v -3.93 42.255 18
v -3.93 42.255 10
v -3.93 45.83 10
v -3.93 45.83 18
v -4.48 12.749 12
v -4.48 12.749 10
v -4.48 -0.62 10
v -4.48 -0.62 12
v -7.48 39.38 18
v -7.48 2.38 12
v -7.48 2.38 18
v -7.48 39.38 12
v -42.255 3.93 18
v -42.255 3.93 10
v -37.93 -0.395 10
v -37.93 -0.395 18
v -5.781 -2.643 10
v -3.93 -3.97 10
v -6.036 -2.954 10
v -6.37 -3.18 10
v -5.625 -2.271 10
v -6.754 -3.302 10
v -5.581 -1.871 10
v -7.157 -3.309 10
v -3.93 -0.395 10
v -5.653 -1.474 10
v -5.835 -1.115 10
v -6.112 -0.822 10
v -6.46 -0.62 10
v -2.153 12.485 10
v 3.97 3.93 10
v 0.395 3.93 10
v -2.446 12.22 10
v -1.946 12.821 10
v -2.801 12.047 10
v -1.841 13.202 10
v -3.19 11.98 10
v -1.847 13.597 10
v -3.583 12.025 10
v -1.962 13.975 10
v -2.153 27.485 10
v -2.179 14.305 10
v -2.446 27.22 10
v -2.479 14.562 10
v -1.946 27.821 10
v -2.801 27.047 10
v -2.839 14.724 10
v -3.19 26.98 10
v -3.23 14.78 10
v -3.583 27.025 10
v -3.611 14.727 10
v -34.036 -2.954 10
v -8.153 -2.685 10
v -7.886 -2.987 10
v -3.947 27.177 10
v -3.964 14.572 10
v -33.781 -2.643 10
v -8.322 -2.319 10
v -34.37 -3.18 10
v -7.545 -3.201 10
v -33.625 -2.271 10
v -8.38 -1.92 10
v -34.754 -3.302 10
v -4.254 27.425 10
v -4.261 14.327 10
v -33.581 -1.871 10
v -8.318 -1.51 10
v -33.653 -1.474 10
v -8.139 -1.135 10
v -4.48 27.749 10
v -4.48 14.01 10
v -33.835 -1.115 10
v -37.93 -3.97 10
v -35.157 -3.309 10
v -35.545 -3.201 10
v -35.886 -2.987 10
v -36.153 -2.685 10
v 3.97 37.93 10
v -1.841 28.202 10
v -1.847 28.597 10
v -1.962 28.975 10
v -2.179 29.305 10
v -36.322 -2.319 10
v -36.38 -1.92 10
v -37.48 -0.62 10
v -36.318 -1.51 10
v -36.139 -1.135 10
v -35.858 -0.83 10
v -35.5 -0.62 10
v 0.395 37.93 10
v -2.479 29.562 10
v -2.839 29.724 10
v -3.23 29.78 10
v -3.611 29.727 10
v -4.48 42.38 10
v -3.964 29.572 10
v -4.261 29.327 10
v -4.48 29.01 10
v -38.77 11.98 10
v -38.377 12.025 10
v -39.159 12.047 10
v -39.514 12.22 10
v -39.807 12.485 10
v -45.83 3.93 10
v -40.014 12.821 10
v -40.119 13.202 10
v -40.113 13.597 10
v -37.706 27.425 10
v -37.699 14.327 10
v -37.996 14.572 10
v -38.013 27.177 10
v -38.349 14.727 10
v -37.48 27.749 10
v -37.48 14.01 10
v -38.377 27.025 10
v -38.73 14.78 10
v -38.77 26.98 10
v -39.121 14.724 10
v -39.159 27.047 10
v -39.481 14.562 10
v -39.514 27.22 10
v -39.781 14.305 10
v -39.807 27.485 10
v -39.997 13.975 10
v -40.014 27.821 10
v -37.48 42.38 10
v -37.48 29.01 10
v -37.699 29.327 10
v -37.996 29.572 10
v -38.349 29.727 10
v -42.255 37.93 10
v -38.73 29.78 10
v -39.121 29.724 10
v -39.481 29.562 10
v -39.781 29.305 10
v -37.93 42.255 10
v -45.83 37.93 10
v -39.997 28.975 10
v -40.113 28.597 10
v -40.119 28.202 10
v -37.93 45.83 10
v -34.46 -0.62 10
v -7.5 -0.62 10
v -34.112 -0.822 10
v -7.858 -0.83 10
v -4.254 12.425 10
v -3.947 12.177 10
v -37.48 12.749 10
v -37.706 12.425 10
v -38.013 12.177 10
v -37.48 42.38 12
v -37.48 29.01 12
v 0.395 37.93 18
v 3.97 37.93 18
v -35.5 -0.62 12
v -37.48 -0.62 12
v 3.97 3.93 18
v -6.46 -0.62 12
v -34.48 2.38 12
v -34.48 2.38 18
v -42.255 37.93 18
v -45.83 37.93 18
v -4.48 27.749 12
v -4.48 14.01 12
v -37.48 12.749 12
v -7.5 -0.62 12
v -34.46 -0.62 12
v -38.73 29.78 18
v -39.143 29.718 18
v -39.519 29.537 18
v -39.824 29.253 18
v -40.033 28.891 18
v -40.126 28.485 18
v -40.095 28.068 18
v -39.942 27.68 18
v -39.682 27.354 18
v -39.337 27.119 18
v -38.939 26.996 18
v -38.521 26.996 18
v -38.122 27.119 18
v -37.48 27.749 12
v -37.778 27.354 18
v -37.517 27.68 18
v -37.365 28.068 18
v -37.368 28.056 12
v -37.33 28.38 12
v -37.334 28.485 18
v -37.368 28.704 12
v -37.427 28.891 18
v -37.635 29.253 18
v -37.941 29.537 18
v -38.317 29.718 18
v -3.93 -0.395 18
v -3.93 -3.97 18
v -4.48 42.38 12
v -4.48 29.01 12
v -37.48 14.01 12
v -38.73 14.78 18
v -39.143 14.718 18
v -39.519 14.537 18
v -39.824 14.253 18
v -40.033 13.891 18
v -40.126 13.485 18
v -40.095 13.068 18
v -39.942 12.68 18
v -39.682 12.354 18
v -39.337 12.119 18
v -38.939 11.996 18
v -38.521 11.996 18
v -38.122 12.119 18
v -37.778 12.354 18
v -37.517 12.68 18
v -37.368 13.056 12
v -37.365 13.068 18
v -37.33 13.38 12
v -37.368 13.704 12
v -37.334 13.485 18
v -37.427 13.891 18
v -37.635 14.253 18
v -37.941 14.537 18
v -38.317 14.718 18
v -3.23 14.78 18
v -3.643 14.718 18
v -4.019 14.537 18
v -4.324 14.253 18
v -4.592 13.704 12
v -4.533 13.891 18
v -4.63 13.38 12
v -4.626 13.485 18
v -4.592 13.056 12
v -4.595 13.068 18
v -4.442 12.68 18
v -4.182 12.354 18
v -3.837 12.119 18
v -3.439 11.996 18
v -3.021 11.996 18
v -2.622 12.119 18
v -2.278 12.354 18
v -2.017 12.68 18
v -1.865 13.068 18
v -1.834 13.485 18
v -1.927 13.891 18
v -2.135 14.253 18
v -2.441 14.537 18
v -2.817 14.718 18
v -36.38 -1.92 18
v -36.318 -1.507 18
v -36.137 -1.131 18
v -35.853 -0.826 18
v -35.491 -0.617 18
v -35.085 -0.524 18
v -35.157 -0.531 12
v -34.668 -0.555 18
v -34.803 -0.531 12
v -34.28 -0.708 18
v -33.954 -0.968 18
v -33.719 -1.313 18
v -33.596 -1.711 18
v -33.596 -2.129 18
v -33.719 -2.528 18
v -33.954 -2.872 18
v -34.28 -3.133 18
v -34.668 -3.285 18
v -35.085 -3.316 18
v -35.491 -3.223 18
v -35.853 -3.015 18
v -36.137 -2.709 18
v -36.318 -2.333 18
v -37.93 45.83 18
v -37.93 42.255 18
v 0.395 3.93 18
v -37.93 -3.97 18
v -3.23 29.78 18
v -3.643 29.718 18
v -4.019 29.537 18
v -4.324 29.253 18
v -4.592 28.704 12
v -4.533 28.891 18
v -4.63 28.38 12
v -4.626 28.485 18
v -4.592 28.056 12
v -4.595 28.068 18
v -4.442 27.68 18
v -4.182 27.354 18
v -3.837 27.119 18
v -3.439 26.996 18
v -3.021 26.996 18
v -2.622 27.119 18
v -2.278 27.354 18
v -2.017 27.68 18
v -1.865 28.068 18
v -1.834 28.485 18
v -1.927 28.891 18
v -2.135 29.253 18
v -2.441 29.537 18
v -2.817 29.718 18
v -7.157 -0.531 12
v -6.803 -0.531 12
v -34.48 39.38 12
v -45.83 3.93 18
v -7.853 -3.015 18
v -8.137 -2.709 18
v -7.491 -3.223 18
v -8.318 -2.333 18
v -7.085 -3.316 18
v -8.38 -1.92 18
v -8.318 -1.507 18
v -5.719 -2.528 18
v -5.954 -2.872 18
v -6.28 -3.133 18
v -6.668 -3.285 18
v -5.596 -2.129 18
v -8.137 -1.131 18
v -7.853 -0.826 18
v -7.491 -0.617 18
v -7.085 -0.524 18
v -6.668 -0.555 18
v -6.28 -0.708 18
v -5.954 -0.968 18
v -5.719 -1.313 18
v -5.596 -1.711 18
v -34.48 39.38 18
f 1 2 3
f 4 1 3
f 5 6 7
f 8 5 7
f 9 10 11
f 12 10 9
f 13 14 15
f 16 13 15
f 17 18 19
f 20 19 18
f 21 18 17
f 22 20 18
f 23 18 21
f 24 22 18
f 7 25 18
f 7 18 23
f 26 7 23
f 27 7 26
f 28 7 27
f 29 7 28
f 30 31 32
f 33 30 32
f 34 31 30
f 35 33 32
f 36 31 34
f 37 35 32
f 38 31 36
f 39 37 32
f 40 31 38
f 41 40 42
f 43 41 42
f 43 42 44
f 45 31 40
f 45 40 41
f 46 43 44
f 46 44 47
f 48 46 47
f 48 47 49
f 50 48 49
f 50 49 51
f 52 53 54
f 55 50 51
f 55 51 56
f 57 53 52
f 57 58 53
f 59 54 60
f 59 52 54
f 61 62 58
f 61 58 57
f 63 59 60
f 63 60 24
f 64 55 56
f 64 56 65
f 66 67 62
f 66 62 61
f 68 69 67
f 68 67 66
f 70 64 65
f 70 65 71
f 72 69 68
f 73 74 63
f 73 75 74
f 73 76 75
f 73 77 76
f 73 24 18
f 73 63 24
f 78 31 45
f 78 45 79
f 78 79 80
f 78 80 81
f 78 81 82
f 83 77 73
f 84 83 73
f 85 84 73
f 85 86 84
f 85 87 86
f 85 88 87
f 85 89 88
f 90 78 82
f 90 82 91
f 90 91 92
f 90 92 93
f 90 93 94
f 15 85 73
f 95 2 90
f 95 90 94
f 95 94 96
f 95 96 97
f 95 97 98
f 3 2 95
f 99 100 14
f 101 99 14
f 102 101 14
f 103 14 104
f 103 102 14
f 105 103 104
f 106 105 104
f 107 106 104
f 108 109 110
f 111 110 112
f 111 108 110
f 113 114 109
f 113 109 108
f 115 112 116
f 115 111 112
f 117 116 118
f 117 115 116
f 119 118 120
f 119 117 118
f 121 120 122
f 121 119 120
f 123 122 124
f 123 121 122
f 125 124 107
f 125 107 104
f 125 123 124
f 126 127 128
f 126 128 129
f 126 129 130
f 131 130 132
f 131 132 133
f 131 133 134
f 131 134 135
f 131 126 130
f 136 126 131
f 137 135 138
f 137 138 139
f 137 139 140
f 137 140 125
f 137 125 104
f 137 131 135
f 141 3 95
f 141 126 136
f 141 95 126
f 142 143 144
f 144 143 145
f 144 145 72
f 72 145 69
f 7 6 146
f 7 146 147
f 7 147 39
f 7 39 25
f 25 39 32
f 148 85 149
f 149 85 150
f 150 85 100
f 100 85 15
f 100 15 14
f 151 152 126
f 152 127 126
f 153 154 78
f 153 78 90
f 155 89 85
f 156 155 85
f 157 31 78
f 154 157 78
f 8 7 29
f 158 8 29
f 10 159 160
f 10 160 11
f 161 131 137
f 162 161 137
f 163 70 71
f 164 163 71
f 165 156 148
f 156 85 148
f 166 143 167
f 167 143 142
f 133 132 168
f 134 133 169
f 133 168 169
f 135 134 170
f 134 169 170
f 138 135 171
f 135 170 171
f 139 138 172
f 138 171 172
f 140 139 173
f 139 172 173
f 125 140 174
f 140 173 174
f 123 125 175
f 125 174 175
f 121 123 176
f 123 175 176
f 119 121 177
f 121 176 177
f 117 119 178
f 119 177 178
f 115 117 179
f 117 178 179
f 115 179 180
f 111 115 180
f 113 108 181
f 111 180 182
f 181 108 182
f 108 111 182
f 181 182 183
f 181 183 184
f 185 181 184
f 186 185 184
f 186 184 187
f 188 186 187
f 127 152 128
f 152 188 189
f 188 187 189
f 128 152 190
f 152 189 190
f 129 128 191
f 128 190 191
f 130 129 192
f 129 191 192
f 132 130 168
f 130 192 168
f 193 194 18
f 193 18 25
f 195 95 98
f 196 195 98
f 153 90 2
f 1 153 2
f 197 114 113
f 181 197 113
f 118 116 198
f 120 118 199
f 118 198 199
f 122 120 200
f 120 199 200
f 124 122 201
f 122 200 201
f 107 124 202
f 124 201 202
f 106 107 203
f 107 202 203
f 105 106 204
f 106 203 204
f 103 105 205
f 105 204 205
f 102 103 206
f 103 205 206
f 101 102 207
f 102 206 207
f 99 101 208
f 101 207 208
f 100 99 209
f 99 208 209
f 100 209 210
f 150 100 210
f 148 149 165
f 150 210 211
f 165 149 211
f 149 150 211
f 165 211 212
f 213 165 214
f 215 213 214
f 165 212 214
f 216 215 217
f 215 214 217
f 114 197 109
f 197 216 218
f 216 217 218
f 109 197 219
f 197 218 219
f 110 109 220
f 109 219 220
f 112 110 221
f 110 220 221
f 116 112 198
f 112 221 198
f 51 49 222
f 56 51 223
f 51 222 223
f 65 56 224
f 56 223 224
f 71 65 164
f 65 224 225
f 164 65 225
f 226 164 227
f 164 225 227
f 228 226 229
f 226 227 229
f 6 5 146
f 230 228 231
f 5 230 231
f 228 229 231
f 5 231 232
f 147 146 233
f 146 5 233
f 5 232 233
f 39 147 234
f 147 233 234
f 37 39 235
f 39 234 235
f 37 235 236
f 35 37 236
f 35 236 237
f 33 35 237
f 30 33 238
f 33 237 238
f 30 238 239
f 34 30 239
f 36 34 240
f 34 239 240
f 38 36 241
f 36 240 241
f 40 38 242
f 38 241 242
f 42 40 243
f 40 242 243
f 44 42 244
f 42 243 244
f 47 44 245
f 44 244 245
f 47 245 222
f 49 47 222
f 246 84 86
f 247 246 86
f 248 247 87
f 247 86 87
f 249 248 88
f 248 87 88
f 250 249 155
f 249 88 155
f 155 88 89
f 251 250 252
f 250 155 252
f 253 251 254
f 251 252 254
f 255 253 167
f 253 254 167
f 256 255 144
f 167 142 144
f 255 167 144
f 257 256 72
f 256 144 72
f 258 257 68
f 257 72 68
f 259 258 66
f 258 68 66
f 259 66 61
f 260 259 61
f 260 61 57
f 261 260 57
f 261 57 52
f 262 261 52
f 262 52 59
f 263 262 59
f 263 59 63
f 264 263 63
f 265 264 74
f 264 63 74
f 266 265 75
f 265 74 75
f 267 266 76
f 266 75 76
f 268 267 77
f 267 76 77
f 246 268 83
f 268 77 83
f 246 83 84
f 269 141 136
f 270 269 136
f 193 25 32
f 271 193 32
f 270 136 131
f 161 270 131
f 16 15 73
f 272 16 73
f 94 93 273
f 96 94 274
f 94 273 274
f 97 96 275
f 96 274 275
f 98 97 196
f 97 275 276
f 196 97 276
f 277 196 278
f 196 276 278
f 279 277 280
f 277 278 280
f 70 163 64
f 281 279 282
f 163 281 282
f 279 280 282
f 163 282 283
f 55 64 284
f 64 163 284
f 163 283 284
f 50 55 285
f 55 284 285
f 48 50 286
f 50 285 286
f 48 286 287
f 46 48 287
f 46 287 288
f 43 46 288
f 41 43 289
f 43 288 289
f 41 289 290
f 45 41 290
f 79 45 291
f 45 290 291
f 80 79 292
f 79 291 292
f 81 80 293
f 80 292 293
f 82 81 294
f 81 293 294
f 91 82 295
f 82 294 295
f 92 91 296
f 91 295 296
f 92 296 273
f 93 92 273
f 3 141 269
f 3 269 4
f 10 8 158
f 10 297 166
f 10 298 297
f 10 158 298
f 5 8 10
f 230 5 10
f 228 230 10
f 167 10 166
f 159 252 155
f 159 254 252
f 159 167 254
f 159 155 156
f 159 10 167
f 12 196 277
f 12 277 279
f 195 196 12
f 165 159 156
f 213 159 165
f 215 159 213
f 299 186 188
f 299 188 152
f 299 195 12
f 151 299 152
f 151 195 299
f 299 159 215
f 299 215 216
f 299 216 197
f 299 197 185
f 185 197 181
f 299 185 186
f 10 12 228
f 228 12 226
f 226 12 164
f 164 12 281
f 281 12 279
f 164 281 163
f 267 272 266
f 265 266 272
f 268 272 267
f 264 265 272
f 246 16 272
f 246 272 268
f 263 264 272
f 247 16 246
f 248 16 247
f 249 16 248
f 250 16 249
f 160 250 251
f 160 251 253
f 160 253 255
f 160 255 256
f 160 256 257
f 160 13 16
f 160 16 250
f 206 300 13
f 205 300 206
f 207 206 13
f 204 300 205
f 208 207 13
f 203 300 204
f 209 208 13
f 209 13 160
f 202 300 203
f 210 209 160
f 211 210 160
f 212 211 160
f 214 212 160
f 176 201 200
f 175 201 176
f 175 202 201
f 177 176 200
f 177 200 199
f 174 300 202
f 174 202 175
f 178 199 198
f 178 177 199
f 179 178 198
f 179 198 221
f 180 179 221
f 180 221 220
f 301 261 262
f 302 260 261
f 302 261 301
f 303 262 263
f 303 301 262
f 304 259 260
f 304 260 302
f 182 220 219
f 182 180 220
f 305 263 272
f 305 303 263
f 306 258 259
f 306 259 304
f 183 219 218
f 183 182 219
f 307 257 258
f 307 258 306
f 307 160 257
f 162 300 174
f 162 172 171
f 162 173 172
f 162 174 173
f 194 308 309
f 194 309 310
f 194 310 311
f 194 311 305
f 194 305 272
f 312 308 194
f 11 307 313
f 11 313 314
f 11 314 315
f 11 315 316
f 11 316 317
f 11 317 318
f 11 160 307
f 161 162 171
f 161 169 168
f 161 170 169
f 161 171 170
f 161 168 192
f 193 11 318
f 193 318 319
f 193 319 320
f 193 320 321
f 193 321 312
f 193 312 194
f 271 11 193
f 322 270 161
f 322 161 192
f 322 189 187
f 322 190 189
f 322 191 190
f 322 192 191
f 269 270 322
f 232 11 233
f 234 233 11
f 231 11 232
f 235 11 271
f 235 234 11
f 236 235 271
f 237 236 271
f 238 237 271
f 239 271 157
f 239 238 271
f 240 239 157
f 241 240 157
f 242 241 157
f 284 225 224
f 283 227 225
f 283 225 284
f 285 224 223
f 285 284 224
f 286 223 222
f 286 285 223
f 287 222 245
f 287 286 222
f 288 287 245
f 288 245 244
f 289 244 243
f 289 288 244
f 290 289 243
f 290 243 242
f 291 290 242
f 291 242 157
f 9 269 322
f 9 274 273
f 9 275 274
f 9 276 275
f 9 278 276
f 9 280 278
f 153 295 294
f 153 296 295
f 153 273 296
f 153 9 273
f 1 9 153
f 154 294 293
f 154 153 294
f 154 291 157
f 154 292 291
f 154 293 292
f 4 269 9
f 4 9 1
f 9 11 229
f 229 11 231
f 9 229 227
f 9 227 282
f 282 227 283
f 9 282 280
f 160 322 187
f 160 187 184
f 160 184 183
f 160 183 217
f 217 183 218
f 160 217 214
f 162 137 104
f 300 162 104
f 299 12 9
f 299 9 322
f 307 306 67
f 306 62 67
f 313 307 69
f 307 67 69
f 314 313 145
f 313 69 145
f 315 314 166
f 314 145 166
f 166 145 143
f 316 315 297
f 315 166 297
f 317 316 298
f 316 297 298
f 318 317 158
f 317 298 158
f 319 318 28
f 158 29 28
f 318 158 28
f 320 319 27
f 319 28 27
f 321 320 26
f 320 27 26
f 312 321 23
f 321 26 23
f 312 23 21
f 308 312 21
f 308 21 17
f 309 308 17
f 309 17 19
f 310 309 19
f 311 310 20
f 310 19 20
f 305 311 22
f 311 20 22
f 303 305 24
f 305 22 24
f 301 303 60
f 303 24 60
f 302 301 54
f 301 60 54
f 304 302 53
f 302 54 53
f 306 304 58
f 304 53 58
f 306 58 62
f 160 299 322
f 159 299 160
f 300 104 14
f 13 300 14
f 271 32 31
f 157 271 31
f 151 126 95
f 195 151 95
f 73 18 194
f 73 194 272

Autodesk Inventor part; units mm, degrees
ref_plane "YZ Plane" through (0, 0, 0) normal (1, 0, 0) x (0, 1, 0)
ref_plane "XZ Plane" through (0, 0, 0) normal (0, 1, 0) x (-1, 0, 0)
ref_plane "Work Plane1" through (0, 0, 10) normal (0, 0, 1) x (1, 0, 0)
sketch "Sketch1" plane through (0, 0, 10) normal (0, 0, 1) x (1, 0, 0)
  line L0 (-4.0299, -0.3538) -> (-2.2322, 1.4439) construction
  arc A0 (-1.4439, 2.2322) -> (-2.2322, 1.4439) centre (-0.9299, 0.9299) ccw construction
  line L1 (-1.4439, 2.2322) -> (0.3538, 4.0299) construction
  line L2 (-37.8299, 42.2137) -> (-37.8299, 45.8299) construction
  line L3 (-37.8299, 45.8299) -> (-4.0299, 45.8299) construction
  line L4 (-4.0299, 45.8299) -> (-4.0299, 42.2137) construction
  line L5 (-4.0299, 4.0299) -> (0.3538, 4.0299) projected
  circle A1 centre (-20.9299, 20.9299) radius 17.5 construction
  line L6 (-20.9299, 58.9723) -> (17.1124, 20.9299) construction
  line L7 (17.1124, 20.9299) -> (-20.9299, -17.1124) construction
  line L8 (-20.9299, -17.1124) -> (-58.9723, 20.9299) construction
  line L9 (-58.9723, 20.9299) -> (-20.9299, 58.9723) construction
  line L10 (-20.9299, 58.9723) -> (-20.9299, -17.1124) construction
  line L11 (17.1124, 20.9299) -> (-58.9723, 20.9299) construction
  line L12 (-20.9299, 58.9723) -> (32.8701, 58.9723) construction
  line L13 (-43.2198, 43.4299) -> (1.7802, 43.4299) construction
  line L14 (1.7802, 43.4299) -> (1.7802, -1.5701) construction
  line L15 (1.7802, -1.5701) -> (-43.2198, -1.5701) construction
  line L16 (-43.2198, -1.5701) -> (-43.2198, 43.4299) construction
  line L17 (-43.2198, 5.1774) -> (-43.2198, 36.6824)
  line L18 (-43.2198, 36.6824) -> (-36.4723, 43.4299)
  line L19 (-36.4723, 43.4299) -> (-5.3876, 43.4299)
  line L20 (-5.3876, 43.4299) -> (1.7802, 36.2621)
  line L21 (1.7802, 36.2621) -> (1.7802, 5.5977)
  line L22 (1.7802, 5.5977) -> (-5.3876, -1.5701)
  line L23 (-5.3876, -1.5701) -> (-36.4723, -1.5701)
  line L24 (-36.4723, -1.5701) -> (-43.2198, 5.1774)
  line L25 (-4.0299, 42.2137) -> (-37.8299, 42.2137) projected
  line L26 (-4.0299, -0.3538) -> (-4.0299, 4.0299) projected
  line L27 (-43.2198, 43.4299) -> (-10.4667, 10.6769) construction
  line L28 (-8.5595, 8.5517) -> (1.7802, -1.5701) construction
  line L29 (1.7802, 43.4299) -> (-25.699, 15.9507) construction
  line L30 (-30.9728, 10.6769) -> (-43.2198, -1.5701) construction
  point P0 (-37.8299, 4.0299)
  dimension "d18" = 53.8
  dimension "d19" = 45
  dimension "d20" = 53.8
  dimension "d21" = 45
  dimension "d22" = 45
extrude "Extrusion1" add sketch "Sketch1" along normal blind 8
sketch "Sketch3" plane through (0, 0, 10) normal (0, 0, -1) x (-1, 0, 0)
  line L0 (37.8299, -0.4701) -> (37.8299, 4.0299) construction
  line L1 (4.0299, 4.0299) -> (4.0299, -0.4701) construction
  line L2 (37.8299, -0.4701) -> (37.8299, 1.1886) construction
  line L3 (4.0299, -3.9701) -> (4.0299, -0.3538) construction
  line L4 (45.8299, 4.0299) -> (42.2137, 4.0299) construction
  line L5 (-0.3538, 4.0299) -> (-3.9701, 4.0299) construction
  line L6 (-3.9701, 37.8299) -> (-0.3538, 37.8299) construction
  line L7 (4.0299, 42.2137) -> (4.0299, 45.8299) construction
  line L8 (37.8299, 45.8299) -> (37.8299, 42.2137) construction
  line L9 (42.2137, 37.8299) -> (45.8299, 37.8299) construction
  line L10 (37.8299, 37.7299) -> (45.8299, 37.7299)
  line L11 (45.8299, 37.7299) -> (45.8299, 4.1299)
  line L12 (45.8299, 4.1299) -> (37.8299, 4.1299)
  line L13 (37.8299, 4.1299) -> (37.8299, 37.7299)
  line L14 (37.7299, 4.0299) -> (4.1299, 4.0299)
  line L15 (4.1299, 4.0299) -> (4.1299, -3.9701)
  line L16 (4.1299, -3.9701) -> (37.7299, -3.9701)
  line L17 (37.7299, -3.9701) -> (37.7299, 4.0299)
  line L18 (4.0299, 4.1299) -> (-3.9701, 4.1299)
  line L19 (-3.9701, 4.1299) -> (-3.9701, 37.7299)
  line L20 (-3.9701, 37.7299) -> (4.0299, 37.7299)
  line L21 (4.0299, 37.7299) -> (4.0299, 4.1299)
  line L22 (4.1299, 37.8299) -> (37.7299, 37.8299)
  line L23 (37.7299, 37.8299) -> (37.7299, 45.8299)
  line L24 (37.7299, 45.8299) -> (4.1299, 45.8299)
  line L25 (4.1299, 45.8299) -> (4.1299, 37.8299)
  point P0 (0, 0)
  dimension "d23" = 0.1
  dimension "d24" = 0.1
  dimension "d25" = 0.1
  dimension "d26" = 0.1
  dimension "d27" = 0.1
extrude "Extrusion3" add sketch "Sketch3" against normal up to surface (8 mm away)
sketch "Skizze12" plane through (0, 0, 10) normal (0, 0, -1) x (-1, 0, 0)
  line L0 (-0.3124, 4.1299) -> (4.1299, -0.3124) projected
  line L1 (4.1299, -0.3124) -> (4.1299, -3.9701) projected
  line L2 (4.1299, -3.9701) -> (37.7299, -3.9701) construction
  line L3 (37.7299, -3.9701) -> (37.7299, -0.3124) projected
  line L4 (37.7299, -0.3124) -> (42.1723, 4.1299) projected
  line L5 (45.8299, 4.1299) -> (42.1723, 4.1299) projected
  line L6 (45.8299, 37.7299) -> (45.8299, 4.1299) construction
  line L7 (42.1723, 37.7299) -> (45.8299, 37.7299) projected
  line L8 (42.1723, 37.7299) -> (37.7299, 42.1723) projected
  line L9 (37.7299, 42.1723) -> (37.7299, 45.8299) projected
  line L10 (37.7299, 45.8299) -> (4.1299, 45.8299) construction
  line L11 (4.1299, 45.8299) -> (4.1299, 42.1723) projected
  line L12 (4.1299, 42.1723) -> (-0.3124, 37.7299) projected
  line L13 (-3.9701, 37.7299) -> (-0.3124, 37.7299) projected
  line L14 (-3.9701, 4.1299) -> (-3.9701, 37.7299) construction
  line L15 (-0.3124, 4.1299) -> (-3.9701, 4.1299) projected
  line L16 (37.9299, -4.1701) -> (3.9299, -4.1701) construction
  line L17 (3.9299, -4.1701) -> (3.9299, -0.3953)
  line L18 (3.9299, -0.3953) -> (-0.3953, 3.9299)
  line L19 (-0.3953, 3.9299) -> (-4.1701, 3.9299)
  line L20 (-4.1701, 3.9299) -> (-4.1701, 37.9299) construction
  line L21 (-4.1701, 37.9299) -> (-0.3953, 37.9299)
  line L22 (-0.3953, 37.9299) -> (3.9299, 42.2551)
  line L23 (3.9299, 42.2551) -> (3.9299, 46.0299)
  line L24 (3.9299, 46.0299) -> (37.9299, 46.0299) construction
  line L25 (37.9299, 46.0299) -> (37.9299, 42.2551)
  line L26 (37.9299, 42.2551) -> (42.2551, 37.9299)
  line L27 (42.2551, 37.9299) -> (46.0299, 37.9299)
  line L28 (46.0299, 37.9299) -> (46.0299, 3.9299) construction
  line L29 (46.0299, 3.9299) -> (42.2551, 3.9299)
  line L30 (42.2551, 3.9299) -> (37.9299, -0.3953)
  line L31 (37.9299, -0.3953) -> (37.9299, -4.1701)
  line L32 (-3.9701, 37.7299) -> (-3.9701, 37.9299)
  line L33 (37.7299, 45.8299) -> (4.1299, 45.8299) projected
  line L34 (4.1299, 45.8299) -> (3.9299, 45.8299)
  line L35 (37.7299, 45.8299) -> (37.9299, 45.8299)
  line L36 (45.8299, 37.7299) -> (45.8299, 37.9299)
  line L37 (45.8299, 4.1299) -> (45.8299, 3.9299)
  line L38 (37.7299, -3.9701) -> (37.9299, -3.9701)
  line L39 (4.1299, -3.9701) -> (3.9299, -3.9701)
  line L40 (-3.9701, 4.1299) -> (-3.9701, 3.9299)
  point P0 (0, 0)
  dimension "d65" = 0.2
extrude "IM_offset" add sketch "Skizze12" against normal up to surface (8 mm away)
sketch "Sketch15" plane through (0, 0, 10) normal (0, 0, -1) x (-1, 0, 0)
  line L0 (-3.9701, 3.9299) -> (-3.9701, 37.9299) projected
  line L1 (-0.3953, 3.9299) -> (-3.9701, 3.9299) projected
  line L2 (3.9299, -0.3953) -> (-0.3953, 3.9299) projected
  line L3 (3.9299, -3.9701) -> (3.9299, -0.3953) projected
  line L4 (3.9299, -3.9701) -> (37.9299, -3.9701) projected
  line L5 (37.9299, -0.3953) -> (37.9299, -3.9701) projected
  line L6 (42.2551, 3.9299) -> (37.9299, -0.3953) projected
  line L7 (45.8299, 3.9299) -> (42.2551, 3.9299) projected
  line L8 (45.8299, 3.9299) -> (45.8299, 37.9299) projected
  line L9 (45.8299, 37.9299) -> (42.2551, 37.9299) projected
  line L10 (42.2551, 37.9299) -> (37.9299, 42.2551) projected
  line L11 (37.9299, 42.2551) -> (37.9299, 45.8299) projected
  line L12 (37.9299, 45.8299) -> (3.9299, 45.8299) projected
  line L13 (3.9299, 45.8299) -> (3.9299, 42.2551) projected
  line L14 (3.9299, 42.2551) -> (-0.3953, 37.9299) projected
  line L15 (-0.3953, 37.9299) -> (-3.9701, 37.9299) projected
  line L16 (37.4799, 42.3799) -> (4.4799, 42.3799)
  line L17 (4.4799, 42.3799) -> (4.4799, -0.6201)
  line L18 (4.4799, -0.6201) -> (37.4799, -0.6201)
  line L19 (37.4799, -0.6201) -> (37.4799, 42.3799)
  line L20 (37.4799, 42.3799) -> (4.4799, -0.6201) construction
  line L21 (4.4799, 42.3799) -> (37.4799, -0.6201) construction
  circle A0 centre (20.9799, 20.8799) radius 16.97 construction
  point P0 (0, 0)
  dimension "d73" = 33
  dimension "d74" = 43
  dimension "d90" = 21.5
  dimension "d91" = 16.5
extrude "Extrusion13" cut sketch "Sketch15" against normal blind 2 contours L19 L18 L17 L16
sketch "Sketch16" plane through (0, 0, 12) normal (0, 0, -1) x (-1, 0, 0)
  line L0 (4.4799, 42.3799) -> (37.4799, 42.3799) projected
  line L1 (4.4799, -0.6201) -> (4.4799, 42.3799) projected
  line L2 (37.4799, -0.6201) -> (4.4799, -0.6201) projected
  line L3 (37.4799, 42.3799) -> (37.4799, -0.6201) projected
  line L4 (7.4799, 39.3799) -> (34.4799, 39.3799)
  line L5 (34.4799, 39.3799) -> (34.4799, 2.3799)
  line L6 (34.4799, 2.3799) -> (7.4799, 2.3799)
  line L7 (7.4799, 2.3799) -> (7.4799, 39.3799)
  dimension "d94" = 3
extrude "Extrusion14" cut sketch "Sketch16" against normal through all contours L4 L5 L6 L7
sketch "Sketch17" plane through (0, 0, 10) normal (0, 0, -1) x (-1, 0, 0)
  line L0 (37.4799, 42.3799) -> (37.4799, -0.6201) projected
  line L1 (4.4799, -0.6201) -> (4.4799, 42.3799) projected
  line L2 (38.7299, 28.3799) -> (3.2299, 28.3799)
  line L3 (3.2299, 28.3799) -> (3.2299, 13.3799)
  line L4 (3.2299, 13.3799) -> (38.7299, 13.3799)
  line L5 (38.7299, 13.3799) -> (38.7299, 28.3799)
  line L6 (38.7299, 28.3799) -> (3.2299, 13.3799) construction
  line L7 (3.2299, 28.3799) -> (38.7299, 13.3799) construction
  line L8 (4.4799, 42.3799) -> (37.4799, 42.3799) projected
  circle A0 centre (20.9799, 20.8799) radius 16.97 construction
  line L9 (37.4799, -0.6201) -> (4.4799, -0.6201) projected
  point P0 (0, 0)
  dimension "d81" = 35.5
  dimension "d82" = 15
  dimension "d92" = 0
  dimension "d93" = 0
hole "Hole1" at (-3.2299, 13.3799, 10) at (-3.2299, 28.3799, 10) at (-38.7299, 28.3799, 10) at (-38.7299, 13.3799, 10) direction (0, 0, 1) diameter 2.8 end through all
sketch "Sketch18" plane through (0, 0, 10) normal (0, 0, -1) x (-1, 0, 0)
  line L0 (45.3299, 43.7299) -> (45.3299, -1.9701) projected
  line L1 (37.9499, -0.2701) -> (37.9499, -3.9701) projected
  line L2 (4.0099, -3.9701) -> (4.0099, 0.1299) projected
  circle A0 centre (6.9799, -1.9201) radius 1.4
  circle A1 centre (34.9799, -1.9201) radius 1.4
  circle A2 centre (20.9799, 20.8799) radius 16.97 construction
  circle A3 centre (20.9799, 20.8799) radius 16.97 construction
  point P0 (0, 0)
  dimension "d95" = 2.8
  dimension "d96" = 2.8
  dimension "d97" = 14
  dimension "d98" = 14
extrude "Extrusion15" cut sketch "Sketch18" against normal blind 10
properties part number "20_Cube_Insert_RaspiCam_v3"
